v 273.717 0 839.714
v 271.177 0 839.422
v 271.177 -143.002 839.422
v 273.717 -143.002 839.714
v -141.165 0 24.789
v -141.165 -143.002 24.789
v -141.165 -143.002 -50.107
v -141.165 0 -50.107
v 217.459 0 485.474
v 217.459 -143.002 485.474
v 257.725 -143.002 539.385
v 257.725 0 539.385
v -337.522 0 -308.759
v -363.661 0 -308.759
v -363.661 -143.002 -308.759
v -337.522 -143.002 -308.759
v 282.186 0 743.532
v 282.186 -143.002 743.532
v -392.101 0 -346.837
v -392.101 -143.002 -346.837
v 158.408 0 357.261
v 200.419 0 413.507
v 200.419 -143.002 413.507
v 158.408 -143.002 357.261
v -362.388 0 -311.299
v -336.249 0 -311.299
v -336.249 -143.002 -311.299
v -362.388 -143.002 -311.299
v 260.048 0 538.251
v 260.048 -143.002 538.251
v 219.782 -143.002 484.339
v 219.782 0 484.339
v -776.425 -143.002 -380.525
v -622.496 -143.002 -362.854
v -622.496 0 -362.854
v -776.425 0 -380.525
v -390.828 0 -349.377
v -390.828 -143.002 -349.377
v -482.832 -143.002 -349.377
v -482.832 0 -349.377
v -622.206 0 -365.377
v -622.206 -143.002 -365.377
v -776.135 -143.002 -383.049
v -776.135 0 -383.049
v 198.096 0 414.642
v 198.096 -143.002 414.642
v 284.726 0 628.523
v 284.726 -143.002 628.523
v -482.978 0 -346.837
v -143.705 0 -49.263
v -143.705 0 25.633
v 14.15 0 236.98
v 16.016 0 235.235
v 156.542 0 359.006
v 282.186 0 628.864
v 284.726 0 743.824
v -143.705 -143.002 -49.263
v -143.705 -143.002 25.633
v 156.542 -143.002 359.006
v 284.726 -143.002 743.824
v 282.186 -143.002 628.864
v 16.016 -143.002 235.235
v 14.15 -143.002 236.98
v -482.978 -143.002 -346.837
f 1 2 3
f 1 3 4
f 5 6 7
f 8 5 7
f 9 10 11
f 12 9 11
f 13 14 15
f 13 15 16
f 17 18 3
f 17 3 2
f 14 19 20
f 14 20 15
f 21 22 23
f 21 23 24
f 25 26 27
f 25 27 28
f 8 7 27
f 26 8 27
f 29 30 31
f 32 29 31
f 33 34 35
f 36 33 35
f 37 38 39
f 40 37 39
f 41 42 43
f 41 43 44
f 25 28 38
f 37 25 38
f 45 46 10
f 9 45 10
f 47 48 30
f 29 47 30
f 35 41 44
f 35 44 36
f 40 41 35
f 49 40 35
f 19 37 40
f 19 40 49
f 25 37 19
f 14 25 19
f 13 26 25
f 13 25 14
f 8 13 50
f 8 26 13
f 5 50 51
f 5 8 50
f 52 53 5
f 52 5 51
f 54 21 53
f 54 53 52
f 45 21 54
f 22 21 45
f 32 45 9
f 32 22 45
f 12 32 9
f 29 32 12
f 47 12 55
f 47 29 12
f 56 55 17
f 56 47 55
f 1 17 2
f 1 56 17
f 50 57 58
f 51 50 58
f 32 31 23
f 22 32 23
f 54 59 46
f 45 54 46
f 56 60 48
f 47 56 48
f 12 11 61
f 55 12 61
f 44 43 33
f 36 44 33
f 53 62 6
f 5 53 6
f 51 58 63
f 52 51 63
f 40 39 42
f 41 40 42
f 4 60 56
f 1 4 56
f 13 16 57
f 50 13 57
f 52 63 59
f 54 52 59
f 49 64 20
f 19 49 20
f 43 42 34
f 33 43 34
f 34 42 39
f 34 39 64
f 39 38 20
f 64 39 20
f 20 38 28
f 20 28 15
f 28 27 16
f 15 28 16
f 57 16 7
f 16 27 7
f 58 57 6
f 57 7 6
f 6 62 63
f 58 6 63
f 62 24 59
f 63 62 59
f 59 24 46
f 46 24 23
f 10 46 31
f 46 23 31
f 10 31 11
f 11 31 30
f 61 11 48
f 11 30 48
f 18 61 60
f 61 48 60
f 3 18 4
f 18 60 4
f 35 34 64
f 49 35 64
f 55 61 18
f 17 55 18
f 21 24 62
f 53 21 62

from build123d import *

# Parameters (mm, degrees)
EXTRUDE_THIN1_DEPTH = 143.002
SKETCH2_W           = 353.476809532
SKETCH2_H           = 287.248033411
CUT_EXTRUDE1_DEPTH  = 2.54
SKETCH5_W           = 2.556683639
SKETCH5_H           = 143.002
BOSS_EXTRUDE1_DEPTH = 96.52
SKETCH6_W           = 436.207107494
SKETCH6_H           = 411.415497476
CUT_EXTRUDE3_DEPTH  = 2.54
SKETCH9_W           = 2.54
SKETCH9_H           = 143.002
BOSS_EXTRUDE2_DEPTH = 154.94


with BuildPart() as part:
    # Sketch1 → Extrude-Thin1 (new body)
    with BuildSketch(Plane(origin=(0, 0, 0), x_dir=(1, 0, 0), z_dir=(0, 1, 0))):
        Polygon((429.494620494, -763.000572689), (282.185626339, -746.088969303), (282.185626339, -628.864042129), (257.724926693, -539.38485687), (217.458740987, -485.473629066), (198.09556878, -414.64160471), (156.541730962, -359.006376852), (68.762687355, -283.781976389), (14.14991429, -236.980223457), (-45.64531009, -156.922132367), (-95.860416986, -89.690582628), (-143.704865867, -25.633038127), (-143.704865867, 49.263431443), (-195.539820534, 118.663748365), (-262.069299432, 207.73813745), (-337.521866174, 308.759389966), (-363.661203016, 308.759389966), (-392.100936643, 346.836524201), (-482.977728206, 346.836524201), (-563.408799351, 356.070301017), (-625.019348636, 363.143414101), (-604.768848946, 539.535957871), (-602.245423716, 539.246259561), (-622.206225096, 365.37714102), (-563.119101041, 358.593726247), (-482.832404898, 349.376524201), (-390.827778697, 349.376524201), (-362.38804507, 311.299389966), (-336.248708228, 311.299389966), (-260.03427333, 209.258094281), (-193.504794432, 120.183705196), (-141.164865867, 50.107293372), (-141.164865867, -24.789176199), (-93.825390885, -88.170625798), (-43.610283989, -155.402175536), (16.016487249, -235.234729602), (70.415510233, -281.853304168), (158.408303922, -357.260882997), (200.418710431, -413.50739743), (219.781882638, -484.339421786), (260.048068344, -538.25064959), (284.725626339, -628.523119941), (284.725626339, -743.823886817), (429.784318804, -760.477147459), align=None)
    extrude(amount=-EXTRUDE_THIN1_DEPTH)

    # Sketch2 → Cut-Extrude1 (cut)
    with BuildSketch(Plane(origin=(-80.868694539, 0, 704.409024928), x_dir=(0.9934744998263692, 0, 0.11405445276158947), z_dir=(-0.11405445276158947, 0, 0.9934744998263692))):
        with Locations((435.779818352, -64.905243111)):
            Rectangle(SKETCH2_W, SKETCH2_H)
    extrude(amount=-CUT_EXTRUDE1_DEPTH, mode=Mode.SUBTRACT)

    # Sketch5 → Boss-Extrude1 (add)
    with BuildSketch(Plane(origin=(-80.578996229, 0, 701.885599699), x_dir=(0.9934744998263692, 0, 0.11405445276158968), z_dir=(-0.1140544527615897, 0, 0.9934744998263693))):
        with Locations((366.425733757, -71.501)):
            Rectangle(SKETCH5_W, SKETCH5_H)
    extrude(amount=BOSS_EXTRUDE1_DEPTH)

    # Sketch6 → Cut-Extrude3 (cut)
    with BuildSketch(Plane(origin=(-658.036684967, 0, -75.544982799), x_dir=(-0.11405445276159007, 0, 0.9934744998263692), z_dir=(-0.993474499826369, 0, -0.11405445276159006))):
        with Locations((-358.307764933, -83.68082163)):
            Rectangle(SKETCH6_W, SKETCH6_H)
    extrude(amount=-CUT_EXTRUDE3_DEPTH, mode=Mode.SUBTRACT)

    # Sketch9 → Boss-Extrude2 (add)
    with BuildSketch(Plane(origin=(-655.513259738, 0, -75.255284489), x_dir=(-0.11405445276159011, 0, 0.9934744998263692), z_dir=(-0.993474499826369, 0, -0.1140544527615901))):
        with Locations((-290.757481915, -71.501)):
            Rectangle(SKETCH9_W, SKETCH9_H)
    extrude(amount=BOSS_EXTRUDE2_DEPTH)


solid = part.part
